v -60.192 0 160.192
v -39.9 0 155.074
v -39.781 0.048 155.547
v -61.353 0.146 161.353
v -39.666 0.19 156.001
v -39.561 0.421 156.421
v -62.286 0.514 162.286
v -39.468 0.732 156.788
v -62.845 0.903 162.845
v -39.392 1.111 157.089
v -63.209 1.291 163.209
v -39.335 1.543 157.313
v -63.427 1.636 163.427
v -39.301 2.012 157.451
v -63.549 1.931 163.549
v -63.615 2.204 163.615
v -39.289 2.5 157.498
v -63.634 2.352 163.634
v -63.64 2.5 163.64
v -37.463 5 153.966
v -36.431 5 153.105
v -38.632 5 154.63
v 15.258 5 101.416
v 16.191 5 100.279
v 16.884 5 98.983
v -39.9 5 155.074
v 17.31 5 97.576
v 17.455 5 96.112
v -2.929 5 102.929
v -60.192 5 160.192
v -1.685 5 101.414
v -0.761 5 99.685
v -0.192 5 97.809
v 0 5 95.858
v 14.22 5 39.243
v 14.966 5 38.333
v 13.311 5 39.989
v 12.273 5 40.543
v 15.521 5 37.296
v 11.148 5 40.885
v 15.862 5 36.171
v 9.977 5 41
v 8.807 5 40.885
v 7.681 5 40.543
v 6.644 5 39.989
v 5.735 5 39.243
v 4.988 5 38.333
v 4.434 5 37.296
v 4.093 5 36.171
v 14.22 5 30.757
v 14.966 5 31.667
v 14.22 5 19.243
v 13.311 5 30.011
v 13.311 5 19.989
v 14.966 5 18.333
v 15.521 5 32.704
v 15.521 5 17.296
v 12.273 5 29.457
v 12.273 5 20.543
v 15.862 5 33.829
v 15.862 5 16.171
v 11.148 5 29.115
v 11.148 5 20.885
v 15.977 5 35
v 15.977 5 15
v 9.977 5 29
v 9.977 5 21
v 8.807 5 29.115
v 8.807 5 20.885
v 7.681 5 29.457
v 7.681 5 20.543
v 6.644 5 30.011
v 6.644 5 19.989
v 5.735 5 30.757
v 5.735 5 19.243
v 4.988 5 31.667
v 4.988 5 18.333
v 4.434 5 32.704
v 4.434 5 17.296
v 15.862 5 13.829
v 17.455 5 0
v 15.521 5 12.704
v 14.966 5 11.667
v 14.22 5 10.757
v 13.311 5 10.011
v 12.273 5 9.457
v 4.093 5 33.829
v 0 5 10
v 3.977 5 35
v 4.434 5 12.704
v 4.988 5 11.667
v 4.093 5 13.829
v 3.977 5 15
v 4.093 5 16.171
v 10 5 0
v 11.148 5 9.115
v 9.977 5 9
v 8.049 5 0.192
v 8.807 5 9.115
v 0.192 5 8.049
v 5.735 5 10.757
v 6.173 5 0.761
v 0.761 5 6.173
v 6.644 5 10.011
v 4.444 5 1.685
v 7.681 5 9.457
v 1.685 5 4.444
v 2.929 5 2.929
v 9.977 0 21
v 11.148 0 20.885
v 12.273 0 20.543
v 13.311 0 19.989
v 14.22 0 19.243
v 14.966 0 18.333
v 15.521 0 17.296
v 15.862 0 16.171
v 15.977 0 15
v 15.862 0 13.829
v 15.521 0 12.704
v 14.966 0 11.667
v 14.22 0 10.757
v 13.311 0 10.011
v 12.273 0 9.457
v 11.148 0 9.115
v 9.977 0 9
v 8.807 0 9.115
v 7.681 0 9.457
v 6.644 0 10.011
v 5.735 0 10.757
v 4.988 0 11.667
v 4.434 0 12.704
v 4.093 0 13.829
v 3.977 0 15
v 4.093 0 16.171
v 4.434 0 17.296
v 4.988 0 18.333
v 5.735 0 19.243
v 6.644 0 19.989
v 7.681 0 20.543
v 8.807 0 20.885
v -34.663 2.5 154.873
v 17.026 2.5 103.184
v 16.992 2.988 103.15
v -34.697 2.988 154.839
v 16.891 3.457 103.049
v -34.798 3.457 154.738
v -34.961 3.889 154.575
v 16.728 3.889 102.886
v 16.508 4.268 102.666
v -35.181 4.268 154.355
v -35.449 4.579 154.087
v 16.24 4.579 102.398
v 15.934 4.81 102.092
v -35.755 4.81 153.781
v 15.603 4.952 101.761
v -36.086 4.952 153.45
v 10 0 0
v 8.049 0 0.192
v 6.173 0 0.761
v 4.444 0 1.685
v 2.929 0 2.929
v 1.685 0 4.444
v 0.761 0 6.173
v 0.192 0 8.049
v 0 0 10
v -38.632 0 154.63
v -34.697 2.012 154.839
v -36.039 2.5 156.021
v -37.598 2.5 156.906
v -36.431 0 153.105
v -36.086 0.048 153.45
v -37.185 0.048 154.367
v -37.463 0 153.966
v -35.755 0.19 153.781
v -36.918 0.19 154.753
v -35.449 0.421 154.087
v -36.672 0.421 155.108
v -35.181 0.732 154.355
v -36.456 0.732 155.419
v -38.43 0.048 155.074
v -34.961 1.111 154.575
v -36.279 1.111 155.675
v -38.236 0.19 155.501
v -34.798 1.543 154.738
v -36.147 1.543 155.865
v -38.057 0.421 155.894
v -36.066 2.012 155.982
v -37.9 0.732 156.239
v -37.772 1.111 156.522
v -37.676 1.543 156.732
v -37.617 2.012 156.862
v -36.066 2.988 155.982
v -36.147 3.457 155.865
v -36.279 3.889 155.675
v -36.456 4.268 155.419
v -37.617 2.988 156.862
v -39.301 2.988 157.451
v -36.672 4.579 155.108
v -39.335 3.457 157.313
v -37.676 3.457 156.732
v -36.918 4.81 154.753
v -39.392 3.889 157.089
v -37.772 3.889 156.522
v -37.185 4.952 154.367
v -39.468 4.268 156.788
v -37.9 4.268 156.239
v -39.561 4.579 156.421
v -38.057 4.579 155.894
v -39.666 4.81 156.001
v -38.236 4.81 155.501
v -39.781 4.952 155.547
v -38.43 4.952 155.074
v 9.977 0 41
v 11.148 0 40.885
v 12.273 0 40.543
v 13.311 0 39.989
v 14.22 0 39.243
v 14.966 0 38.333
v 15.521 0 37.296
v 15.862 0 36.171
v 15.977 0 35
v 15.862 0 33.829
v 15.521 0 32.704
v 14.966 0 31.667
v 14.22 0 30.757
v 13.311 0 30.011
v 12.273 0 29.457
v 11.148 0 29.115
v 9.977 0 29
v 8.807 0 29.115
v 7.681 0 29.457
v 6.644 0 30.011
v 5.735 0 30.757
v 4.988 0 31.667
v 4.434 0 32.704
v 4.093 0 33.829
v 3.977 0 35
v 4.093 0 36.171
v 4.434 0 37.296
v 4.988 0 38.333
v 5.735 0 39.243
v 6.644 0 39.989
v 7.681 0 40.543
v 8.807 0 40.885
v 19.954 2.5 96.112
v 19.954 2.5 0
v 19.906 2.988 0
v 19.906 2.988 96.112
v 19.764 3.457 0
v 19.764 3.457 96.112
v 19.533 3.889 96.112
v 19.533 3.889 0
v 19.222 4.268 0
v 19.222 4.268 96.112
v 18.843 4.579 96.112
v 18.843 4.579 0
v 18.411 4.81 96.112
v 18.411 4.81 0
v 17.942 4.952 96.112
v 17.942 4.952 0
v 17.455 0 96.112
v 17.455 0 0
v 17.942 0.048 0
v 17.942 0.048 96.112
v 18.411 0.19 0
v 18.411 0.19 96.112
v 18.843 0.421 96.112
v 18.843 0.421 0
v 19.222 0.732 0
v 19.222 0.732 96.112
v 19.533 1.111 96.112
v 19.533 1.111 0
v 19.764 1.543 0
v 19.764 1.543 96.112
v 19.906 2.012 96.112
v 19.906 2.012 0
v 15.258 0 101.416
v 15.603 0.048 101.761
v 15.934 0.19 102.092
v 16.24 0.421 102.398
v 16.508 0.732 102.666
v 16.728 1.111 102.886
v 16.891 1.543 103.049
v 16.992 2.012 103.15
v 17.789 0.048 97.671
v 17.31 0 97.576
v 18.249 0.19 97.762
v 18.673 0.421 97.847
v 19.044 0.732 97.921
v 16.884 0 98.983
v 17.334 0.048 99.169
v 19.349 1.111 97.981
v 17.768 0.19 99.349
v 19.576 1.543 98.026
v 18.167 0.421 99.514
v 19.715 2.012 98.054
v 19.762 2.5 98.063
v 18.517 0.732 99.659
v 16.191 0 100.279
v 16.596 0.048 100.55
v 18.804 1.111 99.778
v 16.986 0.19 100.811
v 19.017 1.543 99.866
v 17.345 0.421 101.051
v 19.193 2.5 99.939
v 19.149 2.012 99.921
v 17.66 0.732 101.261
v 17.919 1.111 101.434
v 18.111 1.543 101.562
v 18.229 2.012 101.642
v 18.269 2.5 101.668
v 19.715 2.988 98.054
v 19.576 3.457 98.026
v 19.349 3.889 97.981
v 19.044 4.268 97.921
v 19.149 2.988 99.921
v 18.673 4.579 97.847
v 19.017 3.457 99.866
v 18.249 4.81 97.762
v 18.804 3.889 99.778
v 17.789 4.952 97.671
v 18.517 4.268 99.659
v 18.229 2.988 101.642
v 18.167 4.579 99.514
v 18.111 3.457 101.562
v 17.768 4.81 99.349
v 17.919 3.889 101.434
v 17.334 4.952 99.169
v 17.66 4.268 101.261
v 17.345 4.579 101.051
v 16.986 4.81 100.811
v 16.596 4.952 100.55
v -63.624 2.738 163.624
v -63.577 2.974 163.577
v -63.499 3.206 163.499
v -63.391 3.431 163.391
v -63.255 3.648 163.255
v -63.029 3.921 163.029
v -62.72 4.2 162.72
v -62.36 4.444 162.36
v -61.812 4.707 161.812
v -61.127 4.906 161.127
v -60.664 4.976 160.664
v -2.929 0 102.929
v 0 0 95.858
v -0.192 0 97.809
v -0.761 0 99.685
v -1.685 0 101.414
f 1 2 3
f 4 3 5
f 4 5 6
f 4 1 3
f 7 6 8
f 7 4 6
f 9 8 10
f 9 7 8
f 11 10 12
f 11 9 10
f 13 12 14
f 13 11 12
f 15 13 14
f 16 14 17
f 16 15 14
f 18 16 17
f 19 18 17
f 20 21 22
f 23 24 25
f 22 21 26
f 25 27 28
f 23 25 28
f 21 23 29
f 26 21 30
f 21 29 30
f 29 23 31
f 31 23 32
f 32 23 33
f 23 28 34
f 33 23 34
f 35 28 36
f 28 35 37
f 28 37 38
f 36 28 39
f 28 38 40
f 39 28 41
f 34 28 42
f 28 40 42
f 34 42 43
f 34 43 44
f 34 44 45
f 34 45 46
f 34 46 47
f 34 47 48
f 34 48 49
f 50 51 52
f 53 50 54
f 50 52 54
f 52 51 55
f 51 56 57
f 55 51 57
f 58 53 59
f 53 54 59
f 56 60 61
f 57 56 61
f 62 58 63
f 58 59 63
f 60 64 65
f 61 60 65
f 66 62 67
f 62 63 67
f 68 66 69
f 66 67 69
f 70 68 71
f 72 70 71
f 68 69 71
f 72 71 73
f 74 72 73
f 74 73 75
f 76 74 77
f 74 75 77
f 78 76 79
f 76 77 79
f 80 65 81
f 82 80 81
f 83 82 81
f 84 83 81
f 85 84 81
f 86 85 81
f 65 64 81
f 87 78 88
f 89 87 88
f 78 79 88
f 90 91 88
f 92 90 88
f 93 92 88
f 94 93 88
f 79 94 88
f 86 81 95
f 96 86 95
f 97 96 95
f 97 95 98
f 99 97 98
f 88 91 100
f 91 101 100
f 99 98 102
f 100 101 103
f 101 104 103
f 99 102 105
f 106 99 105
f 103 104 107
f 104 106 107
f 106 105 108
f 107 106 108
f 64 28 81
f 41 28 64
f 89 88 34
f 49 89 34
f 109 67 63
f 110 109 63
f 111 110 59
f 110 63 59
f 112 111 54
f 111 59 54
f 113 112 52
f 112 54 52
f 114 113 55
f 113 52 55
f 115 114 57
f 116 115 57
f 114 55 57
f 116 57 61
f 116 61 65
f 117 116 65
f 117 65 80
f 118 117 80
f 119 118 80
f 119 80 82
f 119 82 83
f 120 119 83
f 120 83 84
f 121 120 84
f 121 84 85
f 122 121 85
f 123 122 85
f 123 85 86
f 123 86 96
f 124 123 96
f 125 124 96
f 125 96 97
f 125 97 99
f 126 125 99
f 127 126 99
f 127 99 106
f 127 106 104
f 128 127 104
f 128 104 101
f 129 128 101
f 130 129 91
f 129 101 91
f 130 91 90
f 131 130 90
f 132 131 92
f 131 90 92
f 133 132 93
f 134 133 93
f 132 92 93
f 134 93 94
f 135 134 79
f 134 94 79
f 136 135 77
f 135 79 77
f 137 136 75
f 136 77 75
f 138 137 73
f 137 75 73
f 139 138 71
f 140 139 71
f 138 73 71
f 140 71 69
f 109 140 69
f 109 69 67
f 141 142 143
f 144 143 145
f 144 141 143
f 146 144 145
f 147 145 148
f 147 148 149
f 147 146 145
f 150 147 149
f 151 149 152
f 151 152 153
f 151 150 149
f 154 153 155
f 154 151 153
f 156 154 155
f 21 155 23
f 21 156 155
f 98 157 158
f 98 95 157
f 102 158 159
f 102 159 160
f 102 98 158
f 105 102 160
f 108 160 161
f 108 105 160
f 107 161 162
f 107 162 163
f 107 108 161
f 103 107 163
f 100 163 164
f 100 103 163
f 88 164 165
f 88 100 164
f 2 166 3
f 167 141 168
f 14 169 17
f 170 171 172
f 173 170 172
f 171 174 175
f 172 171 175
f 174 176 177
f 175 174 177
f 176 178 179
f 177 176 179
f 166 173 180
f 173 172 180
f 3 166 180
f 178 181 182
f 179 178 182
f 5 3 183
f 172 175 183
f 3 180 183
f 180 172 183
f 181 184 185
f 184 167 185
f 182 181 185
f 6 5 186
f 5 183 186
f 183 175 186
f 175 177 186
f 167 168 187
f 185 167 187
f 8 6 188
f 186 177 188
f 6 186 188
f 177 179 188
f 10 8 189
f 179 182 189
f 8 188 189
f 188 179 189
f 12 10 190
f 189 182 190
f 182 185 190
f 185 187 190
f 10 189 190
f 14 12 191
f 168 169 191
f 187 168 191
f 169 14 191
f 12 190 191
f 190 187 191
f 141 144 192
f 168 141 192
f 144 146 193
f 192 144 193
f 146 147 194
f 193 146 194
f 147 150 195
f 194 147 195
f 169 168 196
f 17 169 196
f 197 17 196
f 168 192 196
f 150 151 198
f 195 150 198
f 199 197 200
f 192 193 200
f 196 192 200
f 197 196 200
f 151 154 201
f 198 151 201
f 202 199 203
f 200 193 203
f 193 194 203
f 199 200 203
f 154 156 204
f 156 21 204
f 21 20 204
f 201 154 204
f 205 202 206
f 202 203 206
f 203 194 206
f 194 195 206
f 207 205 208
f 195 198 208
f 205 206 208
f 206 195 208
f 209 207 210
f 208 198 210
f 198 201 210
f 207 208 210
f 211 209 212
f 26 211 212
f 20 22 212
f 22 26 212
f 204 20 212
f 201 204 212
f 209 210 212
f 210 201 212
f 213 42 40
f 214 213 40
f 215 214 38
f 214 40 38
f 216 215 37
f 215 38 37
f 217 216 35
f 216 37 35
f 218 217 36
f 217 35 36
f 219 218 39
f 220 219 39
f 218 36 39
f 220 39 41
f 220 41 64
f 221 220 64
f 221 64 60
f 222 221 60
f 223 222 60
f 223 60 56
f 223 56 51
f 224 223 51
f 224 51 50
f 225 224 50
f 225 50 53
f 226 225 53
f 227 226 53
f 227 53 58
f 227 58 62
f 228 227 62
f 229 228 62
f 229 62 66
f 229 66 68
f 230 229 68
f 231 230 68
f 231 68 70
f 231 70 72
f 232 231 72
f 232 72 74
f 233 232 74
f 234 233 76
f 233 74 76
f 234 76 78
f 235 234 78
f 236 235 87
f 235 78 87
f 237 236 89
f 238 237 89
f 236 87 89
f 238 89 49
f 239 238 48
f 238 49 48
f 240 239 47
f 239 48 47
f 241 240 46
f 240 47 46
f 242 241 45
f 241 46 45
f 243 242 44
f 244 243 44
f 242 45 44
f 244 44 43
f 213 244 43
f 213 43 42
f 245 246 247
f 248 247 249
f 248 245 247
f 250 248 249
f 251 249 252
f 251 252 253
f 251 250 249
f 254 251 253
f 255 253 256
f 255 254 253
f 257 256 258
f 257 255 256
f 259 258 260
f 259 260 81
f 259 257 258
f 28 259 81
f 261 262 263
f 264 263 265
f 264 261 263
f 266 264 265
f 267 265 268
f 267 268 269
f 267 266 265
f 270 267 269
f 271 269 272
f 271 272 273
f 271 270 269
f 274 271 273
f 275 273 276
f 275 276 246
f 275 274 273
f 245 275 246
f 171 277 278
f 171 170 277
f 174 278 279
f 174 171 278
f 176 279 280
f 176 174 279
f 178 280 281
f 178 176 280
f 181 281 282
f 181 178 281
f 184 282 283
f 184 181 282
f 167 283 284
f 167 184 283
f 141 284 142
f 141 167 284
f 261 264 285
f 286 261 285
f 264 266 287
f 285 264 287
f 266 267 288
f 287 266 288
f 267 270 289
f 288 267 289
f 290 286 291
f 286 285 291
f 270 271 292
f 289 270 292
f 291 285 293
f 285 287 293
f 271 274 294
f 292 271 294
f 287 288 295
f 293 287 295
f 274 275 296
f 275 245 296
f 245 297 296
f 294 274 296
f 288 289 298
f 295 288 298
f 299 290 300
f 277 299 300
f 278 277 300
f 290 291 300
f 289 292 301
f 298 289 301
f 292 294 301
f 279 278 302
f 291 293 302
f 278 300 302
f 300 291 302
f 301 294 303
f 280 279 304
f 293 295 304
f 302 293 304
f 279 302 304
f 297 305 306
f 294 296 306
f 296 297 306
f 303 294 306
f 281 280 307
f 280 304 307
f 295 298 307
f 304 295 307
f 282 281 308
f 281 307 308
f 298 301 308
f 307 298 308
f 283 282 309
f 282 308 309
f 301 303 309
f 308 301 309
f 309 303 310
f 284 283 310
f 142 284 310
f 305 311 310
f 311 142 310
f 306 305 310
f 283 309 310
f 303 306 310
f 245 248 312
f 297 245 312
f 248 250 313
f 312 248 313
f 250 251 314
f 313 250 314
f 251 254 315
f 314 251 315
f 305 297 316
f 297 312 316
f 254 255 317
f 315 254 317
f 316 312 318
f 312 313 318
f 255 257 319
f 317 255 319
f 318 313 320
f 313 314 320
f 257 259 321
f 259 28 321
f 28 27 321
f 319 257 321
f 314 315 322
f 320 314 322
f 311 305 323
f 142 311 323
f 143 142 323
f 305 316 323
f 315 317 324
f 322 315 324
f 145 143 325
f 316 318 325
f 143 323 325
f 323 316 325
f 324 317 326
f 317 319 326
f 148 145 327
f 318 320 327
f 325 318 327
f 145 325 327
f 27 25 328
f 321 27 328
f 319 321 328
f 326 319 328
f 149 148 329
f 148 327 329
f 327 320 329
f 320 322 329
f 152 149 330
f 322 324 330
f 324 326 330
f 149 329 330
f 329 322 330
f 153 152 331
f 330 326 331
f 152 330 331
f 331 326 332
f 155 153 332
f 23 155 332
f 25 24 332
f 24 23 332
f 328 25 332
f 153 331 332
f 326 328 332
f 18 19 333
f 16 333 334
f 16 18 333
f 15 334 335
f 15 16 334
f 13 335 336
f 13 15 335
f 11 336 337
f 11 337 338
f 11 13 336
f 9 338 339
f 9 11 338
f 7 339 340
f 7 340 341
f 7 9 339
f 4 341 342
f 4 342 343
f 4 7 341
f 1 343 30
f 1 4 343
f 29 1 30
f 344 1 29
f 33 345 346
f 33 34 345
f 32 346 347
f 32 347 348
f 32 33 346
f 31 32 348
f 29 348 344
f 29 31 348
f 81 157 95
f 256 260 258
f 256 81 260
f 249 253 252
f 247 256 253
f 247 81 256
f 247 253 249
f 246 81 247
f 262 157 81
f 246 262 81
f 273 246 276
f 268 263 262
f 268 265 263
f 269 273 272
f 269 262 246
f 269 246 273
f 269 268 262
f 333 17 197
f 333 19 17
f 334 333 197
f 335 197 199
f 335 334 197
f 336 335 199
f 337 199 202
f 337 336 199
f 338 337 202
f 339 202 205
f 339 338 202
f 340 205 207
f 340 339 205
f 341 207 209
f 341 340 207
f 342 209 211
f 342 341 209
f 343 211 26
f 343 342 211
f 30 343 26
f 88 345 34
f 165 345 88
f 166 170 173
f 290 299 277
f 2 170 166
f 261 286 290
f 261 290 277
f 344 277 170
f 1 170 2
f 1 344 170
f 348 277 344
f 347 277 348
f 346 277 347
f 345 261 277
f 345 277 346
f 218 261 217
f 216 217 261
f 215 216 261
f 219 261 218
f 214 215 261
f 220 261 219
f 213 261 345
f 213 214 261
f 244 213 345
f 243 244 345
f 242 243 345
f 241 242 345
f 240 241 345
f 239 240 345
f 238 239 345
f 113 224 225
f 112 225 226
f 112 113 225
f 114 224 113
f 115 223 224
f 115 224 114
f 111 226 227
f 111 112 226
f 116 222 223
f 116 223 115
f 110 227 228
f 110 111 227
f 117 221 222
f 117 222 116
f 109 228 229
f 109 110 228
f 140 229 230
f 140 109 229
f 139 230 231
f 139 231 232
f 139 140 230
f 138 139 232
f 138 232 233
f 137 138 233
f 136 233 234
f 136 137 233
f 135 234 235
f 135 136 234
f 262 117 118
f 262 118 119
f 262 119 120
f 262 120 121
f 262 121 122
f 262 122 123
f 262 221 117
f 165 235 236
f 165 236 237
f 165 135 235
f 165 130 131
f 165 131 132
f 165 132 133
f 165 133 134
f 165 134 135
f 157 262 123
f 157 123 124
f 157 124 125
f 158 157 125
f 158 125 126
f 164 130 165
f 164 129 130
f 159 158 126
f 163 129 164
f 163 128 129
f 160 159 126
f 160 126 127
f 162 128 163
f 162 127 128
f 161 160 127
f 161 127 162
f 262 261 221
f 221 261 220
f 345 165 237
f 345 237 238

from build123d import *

# Parameters (mm, degrees)
EXTRUDE_2_DEPTH     = 5
SKETCH_5_R          = 6
CUT_EXTRUDE_2_DEPTH = 15
FILLET_1_R          = 10
FILLET_2_R          = 10
FILLET_3_R          = 10
FILLET_6_R          = 10
FILLET_8_R          = 2.5


with BuildPart() as part:
    # 草图2 → 凸台-拉伸2 (new body)
    with BuildSketch(Plane(origin=(0, 0, 0), x_dir=(1, 0, 0), z_dir=(0, 1, 0))):
        Polygon((0, 0), (19.954469714, 0), (19.954469714, -100.254623121), (-36.614072781, -156.823165616), (-63.639610307, -163.639610307), (0, -100), align=None)
    extrude(amount=EXTRUDE_2_DEPTH)

    # 草图5 → 切除-拉伸2 (cut)
    with BuildSketch(Plane(origin=(0, 5, 0), x_dir=(1, 0, 0), z_dir=(0, 1, 0))):
        with Locations(Location((9.977234857, -15, 0), (0, 0, 270))):
            Circle(SKETCH_5_R)
        with Locations(Location((9.977234857, -35, 0), (0, 0, 270))):
            Circle(SKETCH_5_R)
    extrude(amount=-CUT_EXTRUDE_2_DEPTH, mode=Mode.SUBTRACT)

    # 圆角1
    fillet_1_edges = [part.edges().sort_by_distance(p)[0] for p in [
        (0, 2.5, 100),
    ]]
    fillet(fillet_1_edges, radius=FILLET_1_R)

    # 圆角2
    fillet_2_edges = [part.edges().sort_by_distance(p)[0] for p in [
        (19.954469714, 2.5, 100.254623121),
    ]]
    fillet(fillet_2_edges, radius=FILLET_2_R)

    # 圆角3
    fillet_3_edges = [part.edges().sort_by_distance(p)[0] for p in [
        (-36.614072781, 2.5, 156.823165616),
    ]]
    fillet(fillet_3_edges, radius=FILLET_3_R)

    # 圆角6
    fillet_6_edges = [part.edges().sort_by_distance(p)[0] for p in [
        (0, 2.5, 0),
    ]]
    fillet(fillet_6_edges, radius=FILLET_6_R)

    # 圆角8
    fillet_8_edges = [part.edges().sort_by_distance(p)[0] for p in [
        (-51.464251164, 5, 160.568712564),
        (19.954469714, 0, 48.056243749),
        (19.954469714, 5, 48.056243749),
        (19.193265039, 5, 99.939321821),
        (-8.818959374, 0, 129.02805221),
        (-8.818959374, 5, 129.02805221),
        (-36.79844273, 5, 156.498325602),
        (-51.464251164, 0, 160.568712564),
    ]]
    fillet(fillet_8_edges, radius=FILLET_8_R - 0.0001)  # a hair under: the kernel refuses the full size


solid = part.part
